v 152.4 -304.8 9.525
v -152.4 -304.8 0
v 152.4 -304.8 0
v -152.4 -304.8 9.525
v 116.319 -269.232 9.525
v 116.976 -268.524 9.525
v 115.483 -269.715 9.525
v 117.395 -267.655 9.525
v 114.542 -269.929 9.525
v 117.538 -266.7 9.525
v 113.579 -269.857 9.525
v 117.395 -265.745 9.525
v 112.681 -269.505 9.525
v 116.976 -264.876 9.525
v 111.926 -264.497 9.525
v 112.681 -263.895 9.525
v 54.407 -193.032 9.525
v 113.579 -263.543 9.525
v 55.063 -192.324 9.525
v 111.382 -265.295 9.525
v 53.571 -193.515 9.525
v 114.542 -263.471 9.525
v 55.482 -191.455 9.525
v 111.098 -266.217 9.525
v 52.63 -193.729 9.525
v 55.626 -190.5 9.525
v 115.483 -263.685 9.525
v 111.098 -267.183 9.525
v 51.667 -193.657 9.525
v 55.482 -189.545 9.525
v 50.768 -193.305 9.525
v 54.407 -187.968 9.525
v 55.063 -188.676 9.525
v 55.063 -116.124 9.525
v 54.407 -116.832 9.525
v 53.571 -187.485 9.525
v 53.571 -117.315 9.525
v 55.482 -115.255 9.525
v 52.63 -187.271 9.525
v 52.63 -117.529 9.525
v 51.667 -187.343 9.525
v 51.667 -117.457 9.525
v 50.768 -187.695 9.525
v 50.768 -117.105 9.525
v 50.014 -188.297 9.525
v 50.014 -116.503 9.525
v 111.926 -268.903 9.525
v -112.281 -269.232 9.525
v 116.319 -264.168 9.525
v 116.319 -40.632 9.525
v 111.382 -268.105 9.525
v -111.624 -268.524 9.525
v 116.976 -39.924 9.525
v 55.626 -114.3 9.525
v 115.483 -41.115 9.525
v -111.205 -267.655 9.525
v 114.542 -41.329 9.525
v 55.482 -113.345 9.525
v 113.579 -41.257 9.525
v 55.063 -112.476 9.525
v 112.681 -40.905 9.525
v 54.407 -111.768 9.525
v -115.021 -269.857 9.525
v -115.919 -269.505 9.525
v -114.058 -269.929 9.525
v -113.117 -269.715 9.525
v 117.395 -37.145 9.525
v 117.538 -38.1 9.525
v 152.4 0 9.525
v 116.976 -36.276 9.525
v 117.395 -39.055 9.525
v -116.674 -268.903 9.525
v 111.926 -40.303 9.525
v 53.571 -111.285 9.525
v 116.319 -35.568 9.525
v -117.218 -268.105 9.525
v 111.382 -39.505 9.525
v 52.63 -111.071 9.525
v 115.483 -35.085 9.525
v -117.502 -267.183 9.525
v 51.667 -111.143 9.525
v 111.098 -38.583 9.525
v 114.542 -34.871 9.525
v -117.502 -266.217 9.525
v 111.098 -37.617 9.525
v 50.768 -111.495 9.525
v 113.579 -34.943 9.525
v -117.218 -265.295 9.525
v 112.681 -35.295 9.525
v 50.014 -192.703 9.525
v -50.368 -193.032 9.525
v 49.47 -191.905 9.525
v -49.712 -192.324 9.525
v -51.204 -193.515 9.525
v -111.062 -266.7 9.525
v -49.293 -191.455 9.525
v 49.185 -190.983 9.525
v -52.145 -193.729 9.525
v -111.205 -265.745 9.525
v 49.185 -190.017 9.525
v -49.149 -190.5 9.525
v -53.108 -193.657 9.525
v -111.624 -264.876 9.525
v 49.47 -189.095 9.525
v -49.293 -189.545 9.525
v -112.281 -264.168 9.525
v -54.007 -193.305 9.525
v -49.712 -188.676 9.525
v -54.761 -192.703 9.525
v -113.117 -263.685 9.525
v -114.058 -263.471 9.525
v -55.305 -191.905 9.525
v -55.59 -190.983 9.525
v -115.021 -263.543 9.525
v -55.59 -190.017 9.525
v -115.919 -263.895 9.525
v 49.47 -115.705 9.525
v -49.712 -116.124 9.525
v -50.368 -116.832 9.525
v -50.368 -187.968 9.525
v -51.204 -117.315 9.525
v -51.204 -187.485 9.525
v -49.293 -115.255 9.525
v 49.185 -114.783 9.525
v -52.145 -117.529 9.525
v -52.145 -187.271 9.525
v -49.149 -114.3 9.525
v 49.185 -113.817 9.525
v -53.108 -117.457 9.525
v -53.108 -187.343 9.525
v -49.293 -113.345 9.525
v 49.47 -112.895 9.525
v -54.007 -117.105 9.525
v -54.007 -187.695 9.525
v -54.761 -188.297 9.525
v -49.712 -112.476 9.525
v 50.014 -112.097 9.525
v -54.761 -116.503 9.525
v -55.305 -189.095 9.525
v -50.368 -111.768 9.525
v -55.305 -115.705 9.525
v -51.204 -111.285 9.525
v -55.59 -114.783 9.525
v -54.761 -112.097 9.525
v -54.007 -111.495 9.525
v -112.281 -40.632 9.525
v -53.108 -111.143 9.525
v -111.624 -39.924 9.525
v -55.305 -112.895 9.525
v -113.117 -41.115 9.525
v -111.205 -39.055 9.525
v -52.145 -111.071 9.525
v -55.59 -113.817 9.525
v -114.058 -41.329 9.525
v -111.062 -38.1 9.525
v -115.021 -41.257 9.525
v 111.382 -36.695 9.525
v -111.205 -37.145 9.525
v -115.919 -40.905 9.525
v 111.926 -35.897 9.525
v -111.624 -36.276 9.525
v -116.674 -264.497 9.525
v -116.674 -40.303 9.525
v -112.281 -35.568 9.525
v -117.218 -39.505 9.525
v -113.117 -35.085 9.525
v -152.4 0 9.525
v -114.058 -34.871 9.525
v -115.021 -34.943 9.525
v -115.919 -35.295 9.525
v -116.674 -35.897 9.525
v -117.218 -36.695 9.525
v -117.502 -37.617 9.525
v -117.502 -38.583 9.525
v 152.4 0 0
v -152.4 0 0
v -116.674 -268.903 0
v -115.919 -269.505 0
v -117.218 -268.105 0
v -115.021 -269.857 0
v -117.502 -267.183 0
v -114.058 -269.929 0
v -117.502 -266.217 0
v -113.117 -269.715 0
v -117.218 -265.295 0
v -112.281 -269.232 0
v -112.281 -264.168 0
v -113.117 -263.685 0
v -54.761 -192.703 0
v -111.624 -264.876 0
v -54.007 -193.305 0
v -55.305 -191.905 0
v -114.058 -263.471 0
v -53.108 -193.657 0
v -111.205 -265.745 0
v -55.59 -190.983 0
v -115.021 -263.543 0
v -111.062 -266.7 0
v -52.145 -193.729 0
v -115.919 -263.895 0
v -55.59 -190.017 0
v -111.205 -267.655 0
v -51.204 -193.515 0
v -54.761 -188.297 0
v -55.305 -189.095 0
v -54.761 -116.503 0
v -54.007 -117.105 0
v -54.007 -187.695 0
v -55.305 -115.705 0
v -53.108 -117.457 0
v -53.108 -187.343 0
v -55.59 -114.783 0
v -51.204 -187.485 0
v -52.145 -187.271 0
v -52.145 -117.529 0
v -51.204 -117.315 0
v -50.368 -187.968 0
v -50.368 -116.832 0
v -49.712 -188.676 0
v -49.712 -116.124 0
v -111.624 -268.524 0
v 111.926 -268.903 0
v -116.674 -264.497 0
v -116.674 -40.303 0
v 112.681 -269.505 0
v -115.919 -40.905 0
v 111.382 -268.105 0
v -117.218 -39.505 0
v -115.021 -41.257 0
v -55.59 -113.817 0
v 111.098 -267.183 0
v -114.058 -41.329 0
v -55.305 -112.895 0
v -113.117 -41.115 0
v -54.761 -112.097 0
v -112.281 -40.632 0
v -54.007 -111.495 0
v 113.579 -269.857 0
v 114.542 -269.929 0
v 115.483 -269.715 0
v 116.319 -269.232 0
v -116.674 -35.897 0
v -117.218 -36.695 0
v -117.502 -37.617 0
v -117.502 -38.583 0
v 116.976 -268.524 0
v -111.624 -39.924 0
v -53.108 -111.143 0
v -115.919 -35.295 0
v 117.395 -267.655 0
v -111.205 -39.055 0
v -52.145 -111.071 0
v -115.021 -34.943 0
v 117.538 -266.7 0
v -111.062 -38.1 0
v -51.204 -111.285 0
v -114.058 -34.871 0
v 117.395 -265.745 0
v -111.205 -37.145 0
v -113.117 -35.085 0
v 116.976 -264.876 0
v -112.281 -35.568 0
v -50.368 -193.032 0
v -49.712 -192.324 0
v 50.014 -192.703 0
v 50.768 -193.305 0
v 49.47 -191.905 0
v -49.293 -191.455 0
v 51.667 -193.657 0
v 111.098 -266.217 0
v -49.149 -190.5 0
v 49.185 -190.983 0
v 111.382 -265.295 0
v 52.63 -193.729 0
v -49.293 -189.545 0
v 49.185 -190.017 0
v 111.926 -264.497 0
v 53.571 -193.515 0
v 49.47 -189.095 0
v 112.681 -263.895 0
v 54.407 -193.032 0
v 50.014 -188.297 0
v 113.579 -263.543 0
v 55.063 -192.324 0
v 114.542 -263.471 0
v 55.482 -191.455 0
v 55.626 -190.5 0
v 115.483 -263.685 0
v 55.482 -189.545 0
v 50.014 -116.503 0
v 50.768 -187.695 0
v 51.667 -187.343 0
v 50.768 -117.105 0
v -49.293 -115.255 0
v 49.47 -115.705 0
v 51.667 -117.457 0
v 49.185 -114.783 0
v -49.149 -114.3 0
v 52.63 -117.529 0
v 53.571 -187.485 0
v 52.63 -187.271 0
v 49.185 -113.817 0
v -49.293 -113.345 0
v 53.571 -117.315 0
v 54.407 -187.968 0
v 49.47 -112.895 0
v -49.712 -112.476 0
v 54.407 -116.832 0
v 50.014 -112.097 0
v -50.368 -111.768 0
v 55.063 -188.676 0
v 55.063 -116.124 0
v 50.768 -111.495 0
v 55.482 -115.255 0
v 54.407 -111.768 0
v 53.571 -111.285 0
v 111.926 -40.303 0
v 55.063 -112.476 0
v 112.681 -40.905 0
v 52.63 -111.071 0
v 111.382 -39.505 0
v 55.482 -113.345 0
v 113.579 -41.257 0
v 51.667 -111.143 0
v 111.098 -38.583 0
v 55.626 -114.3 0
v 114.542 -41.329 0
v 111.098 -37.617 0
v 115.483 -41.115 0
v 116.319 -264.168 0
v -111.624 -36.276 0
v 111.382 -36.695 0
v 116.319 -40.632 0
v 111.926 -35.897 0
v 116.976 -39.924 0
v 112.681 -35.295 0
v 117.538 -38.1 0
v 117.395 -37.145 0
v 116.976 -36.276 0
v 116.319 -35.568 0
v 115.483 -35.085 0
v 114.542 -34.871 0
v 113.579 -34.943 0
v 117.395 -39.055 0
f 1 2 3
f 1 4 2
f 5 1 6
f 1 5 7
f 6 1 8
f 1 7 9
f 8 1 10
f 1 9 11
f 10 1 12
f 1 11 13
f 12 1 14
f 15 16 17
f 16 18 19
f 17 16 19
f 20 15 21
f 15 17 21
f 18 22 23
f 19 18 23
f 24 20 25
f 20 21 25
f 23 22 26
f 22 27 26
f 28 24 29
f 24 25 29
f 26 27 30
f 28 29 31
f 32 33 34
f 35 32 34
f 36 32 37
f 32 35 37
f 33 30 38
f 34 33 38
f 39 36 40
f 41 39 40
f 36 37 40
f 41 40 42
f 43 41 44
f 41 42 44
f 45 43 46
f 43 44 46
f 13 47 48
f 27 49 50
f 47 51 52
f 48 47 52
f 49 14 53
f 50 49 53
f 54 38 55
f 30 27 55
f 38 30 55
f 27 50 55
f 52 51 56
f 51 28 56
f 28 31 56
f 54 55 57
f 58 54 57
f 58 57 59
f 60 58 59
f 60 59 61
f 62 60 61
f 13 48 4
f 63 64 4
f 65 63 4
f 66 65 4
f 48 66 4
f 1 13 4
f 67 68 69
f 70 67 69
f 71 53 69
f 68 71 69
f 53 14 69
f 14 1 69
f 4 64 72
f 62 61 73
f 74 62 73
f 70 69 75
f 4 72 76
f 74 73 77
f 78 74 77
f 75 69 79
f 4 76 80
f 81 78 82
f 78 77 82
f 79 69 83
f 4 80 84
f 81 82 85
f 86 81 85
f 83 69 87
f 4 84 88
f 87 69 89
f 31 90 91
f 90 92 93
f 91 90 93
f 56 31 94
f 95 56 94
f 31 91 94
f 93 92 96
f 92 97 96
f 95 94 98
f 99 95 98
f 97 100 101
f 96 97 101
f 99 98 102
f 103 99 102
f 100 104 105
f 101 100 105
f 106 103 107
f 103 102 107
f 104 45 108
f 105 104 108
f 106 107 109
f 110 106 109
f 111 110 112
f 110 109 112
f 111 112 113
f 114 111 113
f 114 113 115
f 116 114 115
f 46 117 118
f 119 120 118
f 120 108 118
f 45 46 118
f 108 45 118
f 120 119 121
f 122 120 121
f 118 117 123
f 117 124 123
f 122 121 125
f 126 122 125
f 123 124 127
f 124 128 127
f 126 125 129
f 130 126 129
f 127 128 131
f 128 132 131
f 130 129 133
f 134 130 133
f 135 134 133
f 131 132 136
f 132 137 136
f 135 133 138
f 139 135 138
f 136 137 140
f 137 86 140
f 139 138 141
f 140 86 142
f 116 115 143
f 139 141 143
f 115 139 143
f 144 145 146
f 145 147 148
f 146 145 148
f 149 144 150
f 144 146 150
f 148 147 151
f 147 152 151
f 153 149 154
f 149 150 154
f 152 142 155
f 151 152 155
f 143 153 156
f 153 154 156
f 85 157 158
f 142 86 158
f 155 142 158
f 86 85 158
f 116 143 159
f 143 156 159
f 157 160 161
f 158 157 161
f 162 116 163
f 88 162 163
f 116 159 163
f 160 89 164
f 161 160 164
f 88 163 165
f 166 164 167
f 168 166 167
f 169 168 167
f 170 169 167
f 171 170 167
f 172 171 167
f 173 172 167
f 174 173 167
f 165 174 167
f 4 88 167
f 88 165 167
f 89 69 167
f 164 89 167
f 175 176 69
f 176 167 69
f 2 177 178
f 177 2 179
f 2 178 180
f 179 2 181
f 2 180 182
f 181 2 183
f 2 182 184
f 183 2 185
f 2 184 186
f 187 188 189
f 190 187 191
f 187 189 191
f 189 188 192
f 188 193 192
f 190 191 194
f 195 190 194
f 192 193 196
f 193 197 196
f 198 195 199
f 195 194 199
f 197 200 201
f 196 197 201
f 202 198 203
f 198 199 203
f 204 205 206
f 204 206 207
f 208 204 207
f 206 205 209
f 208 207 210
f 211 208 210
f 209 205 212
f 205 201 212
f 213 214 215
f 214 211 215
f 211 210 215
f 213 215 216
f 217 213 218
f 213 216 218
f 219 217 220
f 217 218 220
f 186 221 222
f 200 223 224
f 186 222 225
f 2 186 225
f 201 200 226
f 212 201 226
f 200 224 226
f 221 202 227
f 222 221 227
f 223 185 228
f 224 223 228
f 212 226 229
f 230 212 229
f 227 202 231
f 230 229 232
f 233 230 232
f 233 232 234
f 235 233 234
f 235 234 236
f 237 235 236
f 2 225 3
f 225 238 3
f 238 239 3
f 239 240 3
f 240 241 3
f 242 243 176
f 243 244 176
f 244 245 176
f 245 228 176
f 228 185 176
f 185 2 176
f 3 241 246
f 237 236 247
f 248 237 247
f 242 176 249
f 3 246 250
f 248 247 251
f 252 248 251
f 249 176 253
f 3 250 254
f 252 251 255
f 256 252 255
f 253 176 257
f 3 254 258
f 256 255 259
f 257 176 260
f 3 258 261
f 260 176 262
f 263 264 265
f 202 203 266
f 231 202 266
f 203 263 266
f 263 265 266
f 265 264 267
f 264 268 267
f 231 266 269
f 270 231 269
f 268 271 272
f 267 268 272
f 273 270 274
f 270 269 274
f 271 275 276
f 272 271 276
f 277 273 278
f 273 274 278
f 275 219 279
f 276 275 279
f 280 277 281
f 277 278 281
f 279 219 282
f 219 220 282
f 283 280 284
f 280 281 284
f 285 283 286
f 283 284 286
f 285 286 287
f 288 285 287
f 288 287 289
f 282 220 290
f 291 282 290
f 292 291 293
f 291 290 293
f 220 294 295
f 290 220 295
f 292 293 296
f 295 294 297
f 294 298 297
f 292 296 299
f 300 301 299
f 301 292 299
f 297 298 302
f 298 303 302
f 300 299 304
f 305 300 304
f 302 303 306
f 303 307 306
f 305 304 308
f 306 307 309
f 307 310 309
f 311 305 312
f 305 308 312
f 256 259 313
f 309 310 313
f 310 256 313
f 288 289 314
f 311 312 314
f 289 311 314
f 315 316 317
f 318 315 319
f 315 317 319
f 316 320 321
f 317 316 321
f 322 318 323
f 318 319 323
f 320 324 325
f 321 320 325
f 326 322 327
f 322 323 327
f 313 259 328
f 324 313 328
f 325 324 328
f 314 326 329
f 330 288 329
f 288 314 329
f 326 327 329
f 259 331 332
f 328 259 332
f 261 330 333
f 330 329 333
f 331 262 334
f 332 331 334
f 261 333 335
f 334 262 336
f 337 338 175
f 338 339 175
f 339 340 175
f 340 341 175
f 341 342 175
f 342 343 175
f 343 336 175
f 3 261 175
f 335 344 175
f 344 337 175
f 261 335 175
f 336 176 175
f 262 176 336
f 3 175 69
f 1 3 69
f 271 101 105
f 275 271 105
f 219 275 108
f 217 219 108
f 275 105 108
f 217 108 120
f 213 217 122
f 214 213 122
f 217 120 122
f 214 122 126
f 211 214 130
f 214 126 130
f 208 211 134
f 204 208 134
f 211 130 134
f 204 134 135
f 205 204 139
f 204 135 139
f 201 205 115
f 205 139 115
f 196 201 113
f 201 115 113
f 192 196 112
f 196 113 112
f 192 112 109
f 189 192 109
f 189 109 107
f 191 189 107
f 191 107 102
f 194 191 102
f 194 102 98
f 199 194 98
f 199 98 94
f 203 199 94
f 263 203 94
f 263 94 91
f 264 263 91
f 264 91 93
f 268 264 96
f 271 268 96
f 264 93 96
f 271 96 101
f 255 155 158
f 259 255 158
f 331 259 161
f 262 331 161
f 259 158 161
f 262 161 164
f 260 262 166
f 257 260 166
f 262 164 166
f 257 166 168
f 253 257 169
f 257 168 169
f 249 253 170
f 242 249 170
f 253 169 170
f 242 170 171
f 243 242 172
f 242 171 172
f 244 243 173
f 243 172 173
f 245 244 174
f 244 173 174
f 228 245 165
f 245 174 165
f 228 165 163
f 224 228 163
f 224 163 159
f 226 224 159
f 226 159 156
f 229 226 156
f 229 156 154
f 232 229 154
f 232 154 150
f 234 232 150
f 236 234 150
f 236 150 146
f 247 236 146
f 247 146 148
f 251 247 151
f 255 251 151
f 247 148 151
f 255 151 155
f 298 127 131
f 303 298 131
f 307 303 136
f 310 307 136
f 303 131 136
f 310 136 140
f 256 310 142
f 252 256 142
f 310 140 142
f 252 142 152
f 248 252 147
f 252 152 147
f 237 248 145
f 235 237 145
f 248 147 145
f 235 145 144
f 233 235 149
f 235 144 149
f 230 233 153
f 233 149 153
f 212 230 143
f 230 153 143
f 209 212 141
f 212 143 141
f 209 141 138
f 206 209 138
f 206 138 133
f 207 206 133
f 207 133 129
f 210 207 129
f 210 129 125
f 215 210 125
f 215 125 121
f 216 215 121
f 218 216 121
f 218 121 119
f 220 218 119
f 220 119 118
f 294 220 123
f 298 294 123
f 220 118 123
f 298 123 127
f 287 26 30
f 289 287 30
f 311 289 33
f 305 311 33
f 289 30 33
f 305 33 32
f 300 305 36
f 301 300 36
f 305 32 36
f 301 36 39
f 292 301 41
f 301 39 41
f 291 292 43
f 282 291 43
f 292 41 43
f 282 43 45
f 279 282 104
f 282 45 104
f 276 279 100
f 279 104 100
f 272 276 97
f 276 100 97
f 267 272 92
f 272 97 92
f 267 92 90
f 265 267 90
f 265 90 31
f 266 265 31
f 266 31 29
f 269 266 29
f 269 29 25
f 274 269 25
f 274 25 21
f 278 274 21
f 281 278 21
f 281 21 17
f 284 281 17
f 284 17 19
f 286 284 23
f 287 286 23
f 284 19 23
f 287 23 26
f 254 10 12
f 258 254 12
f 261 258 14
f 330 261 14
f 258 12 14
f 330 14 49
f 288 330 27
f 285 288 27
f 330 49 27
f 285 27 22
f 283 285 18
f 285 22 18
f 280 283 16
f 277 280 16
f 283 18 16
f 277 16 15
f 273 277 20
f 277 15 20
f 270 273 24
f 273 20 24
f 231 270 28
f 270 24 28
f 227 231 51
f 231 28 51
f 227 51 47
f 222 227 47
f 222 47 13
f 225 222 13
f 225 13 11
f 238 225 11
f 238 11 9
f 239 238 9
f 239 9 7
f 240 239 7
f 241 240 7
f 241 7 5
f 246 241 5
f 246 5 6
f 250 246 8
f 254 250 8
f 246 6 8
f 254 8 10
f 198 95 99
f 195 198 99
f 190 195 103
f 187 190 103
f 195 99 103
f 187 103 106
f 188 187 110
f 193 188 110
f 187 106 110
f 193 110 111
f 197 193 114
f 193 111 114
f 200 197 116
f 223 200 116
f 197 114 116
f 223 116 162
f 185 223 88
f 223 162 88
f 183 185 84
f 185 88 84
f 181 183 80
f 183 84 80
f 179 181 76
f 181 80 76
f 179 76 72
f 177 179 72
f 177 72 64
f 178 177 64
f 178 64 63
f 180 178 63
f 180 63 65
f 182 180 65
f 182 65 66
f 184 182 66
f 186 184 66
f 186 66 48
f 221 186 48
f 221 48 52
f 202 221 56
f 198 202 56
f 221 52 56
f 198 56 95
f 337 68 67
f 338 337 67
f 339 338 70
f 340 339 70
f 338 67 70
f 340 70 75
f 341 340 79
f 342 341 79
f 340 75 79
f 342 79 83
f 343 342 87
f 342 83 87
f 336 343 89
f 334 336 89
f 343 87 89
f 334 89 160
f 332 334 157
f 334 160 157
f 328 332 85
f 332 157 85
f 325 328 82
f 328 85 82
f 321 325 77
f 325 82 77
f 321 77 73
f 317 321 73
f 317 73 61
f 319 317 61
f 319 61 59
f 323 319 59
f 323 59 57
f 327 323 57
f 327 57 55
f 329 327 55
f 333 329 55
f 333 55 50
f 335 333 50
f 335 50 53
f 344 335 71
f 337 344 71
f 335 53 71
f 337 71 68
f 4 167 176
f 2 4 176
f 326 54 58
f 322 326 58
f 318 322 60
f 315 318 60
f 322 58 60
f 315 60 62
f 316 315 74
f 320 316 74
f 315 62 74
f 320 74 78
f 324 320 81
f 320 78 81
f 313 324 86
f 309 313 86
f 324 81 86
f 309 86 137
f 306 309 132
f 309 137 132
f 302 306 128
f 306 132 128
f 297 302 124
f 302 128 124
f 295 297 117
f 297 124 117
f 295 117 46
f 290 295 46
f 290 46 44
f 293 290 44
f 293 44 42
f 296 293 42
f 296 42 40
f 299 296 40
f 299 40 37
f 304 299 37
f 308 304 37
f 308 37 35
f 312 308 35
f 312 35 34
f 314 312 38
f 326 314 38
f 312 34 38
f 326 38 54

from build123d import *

# Parameters (mm, degrees)
F1_DEPTH  = 304.8
F2_R      = 3.2385
F3_DEPTH  = 9.525
F4_R      = 3.2385
F5_DEPTH  = 9.525
F7_R      = 6.35
F8_DEPTH  = 304.801
F9_R      = 4.78155
F10_DEPTH = 304.801


with BuildPart() as f1:
    # F0 (on Front) → F1 (new body)
    with BuildSketch(Plane.XZ):
        Polygon((-152.4, 0), (-142.875, 0), (142.875, 0), (152.4, 0), (152.4, 9.525), (-152.4, 9.525), align=None)
    extrude(amount=F1_DEPTH)

    # F2 (on face) → F3 (cut, through all)
    with BuildSketch(Plane.XY.offset(9.525)):
        with Locations((-52.3875, -114.3)):
            Circle(F2_R)
        with Locations((52.3875, -114.3)):
            Circle(F2_R)
        with Locations((-52.3875, -190.5)):
            Circle(F2_R)
        with Locations((52.3875, -190.5)):
            Circle(F2_R)
    extrude(amount=-F3_DEPTH, mode=Mode.SUBTRACT)

    # F4 (on face) → F5 (cut, through all)
    with BuildSketch(Plane.XY.offset(9.525)):
        with Locations((-114.3, -38.1)):
            Circle(F4_R)
        with Locations((114.3, -38.1)):
            Circle(F4_R)
        with Locations((-114.3, -266.7)):
            Circle(F4_R)
        with Locations((114.3, -266.7)):
            Circle(F4_R)
    extrude(amount=-F5_DEPTH, mode=Mode.SUBTRACT)

    # F7 (on face) → F8 (cut, through all)
    with BuildSketch(Plane(origin=(-152.4, 0, 0), x_dir=(0, -1, 0), z_dir=(-1, 0, 0))):
        with Locations((38.1, 37.703125)):
            Circle(F7_R)
        with Locations((266.7147, 37.703125)):
            Circle(F7_R)
    extrude(amount=-F8_DEPTH, mode=Mode.SUBTRACT)

    # F9 (on face) → F10 (cut, through all)
    with BuildSketch(Plane(origin=(-152.4, 0, 0), x_dir=(0, -1, 0), z_dir=(-1, 0, 0))):
        with Locations((100.0125, 247.65)):
            Circle(F9_R)
        with Locations((204.7875, 247.65)):
            Circle(F9_R)
        with Locations((100.0125, 228.6)):
            Circle(F9_R)
        with Locations((204.7875, 228.6)):
            Circle(F9_R)
        with Locations((100.0125, 209.55)):
            Circle(F9_R)
        with Locations((204.7875, 209.55)):
            Circle(F9_R)
    extrude(amount=-F10_DEPTH, mode=Mode.SUBTRACT)


solid = f1.part
